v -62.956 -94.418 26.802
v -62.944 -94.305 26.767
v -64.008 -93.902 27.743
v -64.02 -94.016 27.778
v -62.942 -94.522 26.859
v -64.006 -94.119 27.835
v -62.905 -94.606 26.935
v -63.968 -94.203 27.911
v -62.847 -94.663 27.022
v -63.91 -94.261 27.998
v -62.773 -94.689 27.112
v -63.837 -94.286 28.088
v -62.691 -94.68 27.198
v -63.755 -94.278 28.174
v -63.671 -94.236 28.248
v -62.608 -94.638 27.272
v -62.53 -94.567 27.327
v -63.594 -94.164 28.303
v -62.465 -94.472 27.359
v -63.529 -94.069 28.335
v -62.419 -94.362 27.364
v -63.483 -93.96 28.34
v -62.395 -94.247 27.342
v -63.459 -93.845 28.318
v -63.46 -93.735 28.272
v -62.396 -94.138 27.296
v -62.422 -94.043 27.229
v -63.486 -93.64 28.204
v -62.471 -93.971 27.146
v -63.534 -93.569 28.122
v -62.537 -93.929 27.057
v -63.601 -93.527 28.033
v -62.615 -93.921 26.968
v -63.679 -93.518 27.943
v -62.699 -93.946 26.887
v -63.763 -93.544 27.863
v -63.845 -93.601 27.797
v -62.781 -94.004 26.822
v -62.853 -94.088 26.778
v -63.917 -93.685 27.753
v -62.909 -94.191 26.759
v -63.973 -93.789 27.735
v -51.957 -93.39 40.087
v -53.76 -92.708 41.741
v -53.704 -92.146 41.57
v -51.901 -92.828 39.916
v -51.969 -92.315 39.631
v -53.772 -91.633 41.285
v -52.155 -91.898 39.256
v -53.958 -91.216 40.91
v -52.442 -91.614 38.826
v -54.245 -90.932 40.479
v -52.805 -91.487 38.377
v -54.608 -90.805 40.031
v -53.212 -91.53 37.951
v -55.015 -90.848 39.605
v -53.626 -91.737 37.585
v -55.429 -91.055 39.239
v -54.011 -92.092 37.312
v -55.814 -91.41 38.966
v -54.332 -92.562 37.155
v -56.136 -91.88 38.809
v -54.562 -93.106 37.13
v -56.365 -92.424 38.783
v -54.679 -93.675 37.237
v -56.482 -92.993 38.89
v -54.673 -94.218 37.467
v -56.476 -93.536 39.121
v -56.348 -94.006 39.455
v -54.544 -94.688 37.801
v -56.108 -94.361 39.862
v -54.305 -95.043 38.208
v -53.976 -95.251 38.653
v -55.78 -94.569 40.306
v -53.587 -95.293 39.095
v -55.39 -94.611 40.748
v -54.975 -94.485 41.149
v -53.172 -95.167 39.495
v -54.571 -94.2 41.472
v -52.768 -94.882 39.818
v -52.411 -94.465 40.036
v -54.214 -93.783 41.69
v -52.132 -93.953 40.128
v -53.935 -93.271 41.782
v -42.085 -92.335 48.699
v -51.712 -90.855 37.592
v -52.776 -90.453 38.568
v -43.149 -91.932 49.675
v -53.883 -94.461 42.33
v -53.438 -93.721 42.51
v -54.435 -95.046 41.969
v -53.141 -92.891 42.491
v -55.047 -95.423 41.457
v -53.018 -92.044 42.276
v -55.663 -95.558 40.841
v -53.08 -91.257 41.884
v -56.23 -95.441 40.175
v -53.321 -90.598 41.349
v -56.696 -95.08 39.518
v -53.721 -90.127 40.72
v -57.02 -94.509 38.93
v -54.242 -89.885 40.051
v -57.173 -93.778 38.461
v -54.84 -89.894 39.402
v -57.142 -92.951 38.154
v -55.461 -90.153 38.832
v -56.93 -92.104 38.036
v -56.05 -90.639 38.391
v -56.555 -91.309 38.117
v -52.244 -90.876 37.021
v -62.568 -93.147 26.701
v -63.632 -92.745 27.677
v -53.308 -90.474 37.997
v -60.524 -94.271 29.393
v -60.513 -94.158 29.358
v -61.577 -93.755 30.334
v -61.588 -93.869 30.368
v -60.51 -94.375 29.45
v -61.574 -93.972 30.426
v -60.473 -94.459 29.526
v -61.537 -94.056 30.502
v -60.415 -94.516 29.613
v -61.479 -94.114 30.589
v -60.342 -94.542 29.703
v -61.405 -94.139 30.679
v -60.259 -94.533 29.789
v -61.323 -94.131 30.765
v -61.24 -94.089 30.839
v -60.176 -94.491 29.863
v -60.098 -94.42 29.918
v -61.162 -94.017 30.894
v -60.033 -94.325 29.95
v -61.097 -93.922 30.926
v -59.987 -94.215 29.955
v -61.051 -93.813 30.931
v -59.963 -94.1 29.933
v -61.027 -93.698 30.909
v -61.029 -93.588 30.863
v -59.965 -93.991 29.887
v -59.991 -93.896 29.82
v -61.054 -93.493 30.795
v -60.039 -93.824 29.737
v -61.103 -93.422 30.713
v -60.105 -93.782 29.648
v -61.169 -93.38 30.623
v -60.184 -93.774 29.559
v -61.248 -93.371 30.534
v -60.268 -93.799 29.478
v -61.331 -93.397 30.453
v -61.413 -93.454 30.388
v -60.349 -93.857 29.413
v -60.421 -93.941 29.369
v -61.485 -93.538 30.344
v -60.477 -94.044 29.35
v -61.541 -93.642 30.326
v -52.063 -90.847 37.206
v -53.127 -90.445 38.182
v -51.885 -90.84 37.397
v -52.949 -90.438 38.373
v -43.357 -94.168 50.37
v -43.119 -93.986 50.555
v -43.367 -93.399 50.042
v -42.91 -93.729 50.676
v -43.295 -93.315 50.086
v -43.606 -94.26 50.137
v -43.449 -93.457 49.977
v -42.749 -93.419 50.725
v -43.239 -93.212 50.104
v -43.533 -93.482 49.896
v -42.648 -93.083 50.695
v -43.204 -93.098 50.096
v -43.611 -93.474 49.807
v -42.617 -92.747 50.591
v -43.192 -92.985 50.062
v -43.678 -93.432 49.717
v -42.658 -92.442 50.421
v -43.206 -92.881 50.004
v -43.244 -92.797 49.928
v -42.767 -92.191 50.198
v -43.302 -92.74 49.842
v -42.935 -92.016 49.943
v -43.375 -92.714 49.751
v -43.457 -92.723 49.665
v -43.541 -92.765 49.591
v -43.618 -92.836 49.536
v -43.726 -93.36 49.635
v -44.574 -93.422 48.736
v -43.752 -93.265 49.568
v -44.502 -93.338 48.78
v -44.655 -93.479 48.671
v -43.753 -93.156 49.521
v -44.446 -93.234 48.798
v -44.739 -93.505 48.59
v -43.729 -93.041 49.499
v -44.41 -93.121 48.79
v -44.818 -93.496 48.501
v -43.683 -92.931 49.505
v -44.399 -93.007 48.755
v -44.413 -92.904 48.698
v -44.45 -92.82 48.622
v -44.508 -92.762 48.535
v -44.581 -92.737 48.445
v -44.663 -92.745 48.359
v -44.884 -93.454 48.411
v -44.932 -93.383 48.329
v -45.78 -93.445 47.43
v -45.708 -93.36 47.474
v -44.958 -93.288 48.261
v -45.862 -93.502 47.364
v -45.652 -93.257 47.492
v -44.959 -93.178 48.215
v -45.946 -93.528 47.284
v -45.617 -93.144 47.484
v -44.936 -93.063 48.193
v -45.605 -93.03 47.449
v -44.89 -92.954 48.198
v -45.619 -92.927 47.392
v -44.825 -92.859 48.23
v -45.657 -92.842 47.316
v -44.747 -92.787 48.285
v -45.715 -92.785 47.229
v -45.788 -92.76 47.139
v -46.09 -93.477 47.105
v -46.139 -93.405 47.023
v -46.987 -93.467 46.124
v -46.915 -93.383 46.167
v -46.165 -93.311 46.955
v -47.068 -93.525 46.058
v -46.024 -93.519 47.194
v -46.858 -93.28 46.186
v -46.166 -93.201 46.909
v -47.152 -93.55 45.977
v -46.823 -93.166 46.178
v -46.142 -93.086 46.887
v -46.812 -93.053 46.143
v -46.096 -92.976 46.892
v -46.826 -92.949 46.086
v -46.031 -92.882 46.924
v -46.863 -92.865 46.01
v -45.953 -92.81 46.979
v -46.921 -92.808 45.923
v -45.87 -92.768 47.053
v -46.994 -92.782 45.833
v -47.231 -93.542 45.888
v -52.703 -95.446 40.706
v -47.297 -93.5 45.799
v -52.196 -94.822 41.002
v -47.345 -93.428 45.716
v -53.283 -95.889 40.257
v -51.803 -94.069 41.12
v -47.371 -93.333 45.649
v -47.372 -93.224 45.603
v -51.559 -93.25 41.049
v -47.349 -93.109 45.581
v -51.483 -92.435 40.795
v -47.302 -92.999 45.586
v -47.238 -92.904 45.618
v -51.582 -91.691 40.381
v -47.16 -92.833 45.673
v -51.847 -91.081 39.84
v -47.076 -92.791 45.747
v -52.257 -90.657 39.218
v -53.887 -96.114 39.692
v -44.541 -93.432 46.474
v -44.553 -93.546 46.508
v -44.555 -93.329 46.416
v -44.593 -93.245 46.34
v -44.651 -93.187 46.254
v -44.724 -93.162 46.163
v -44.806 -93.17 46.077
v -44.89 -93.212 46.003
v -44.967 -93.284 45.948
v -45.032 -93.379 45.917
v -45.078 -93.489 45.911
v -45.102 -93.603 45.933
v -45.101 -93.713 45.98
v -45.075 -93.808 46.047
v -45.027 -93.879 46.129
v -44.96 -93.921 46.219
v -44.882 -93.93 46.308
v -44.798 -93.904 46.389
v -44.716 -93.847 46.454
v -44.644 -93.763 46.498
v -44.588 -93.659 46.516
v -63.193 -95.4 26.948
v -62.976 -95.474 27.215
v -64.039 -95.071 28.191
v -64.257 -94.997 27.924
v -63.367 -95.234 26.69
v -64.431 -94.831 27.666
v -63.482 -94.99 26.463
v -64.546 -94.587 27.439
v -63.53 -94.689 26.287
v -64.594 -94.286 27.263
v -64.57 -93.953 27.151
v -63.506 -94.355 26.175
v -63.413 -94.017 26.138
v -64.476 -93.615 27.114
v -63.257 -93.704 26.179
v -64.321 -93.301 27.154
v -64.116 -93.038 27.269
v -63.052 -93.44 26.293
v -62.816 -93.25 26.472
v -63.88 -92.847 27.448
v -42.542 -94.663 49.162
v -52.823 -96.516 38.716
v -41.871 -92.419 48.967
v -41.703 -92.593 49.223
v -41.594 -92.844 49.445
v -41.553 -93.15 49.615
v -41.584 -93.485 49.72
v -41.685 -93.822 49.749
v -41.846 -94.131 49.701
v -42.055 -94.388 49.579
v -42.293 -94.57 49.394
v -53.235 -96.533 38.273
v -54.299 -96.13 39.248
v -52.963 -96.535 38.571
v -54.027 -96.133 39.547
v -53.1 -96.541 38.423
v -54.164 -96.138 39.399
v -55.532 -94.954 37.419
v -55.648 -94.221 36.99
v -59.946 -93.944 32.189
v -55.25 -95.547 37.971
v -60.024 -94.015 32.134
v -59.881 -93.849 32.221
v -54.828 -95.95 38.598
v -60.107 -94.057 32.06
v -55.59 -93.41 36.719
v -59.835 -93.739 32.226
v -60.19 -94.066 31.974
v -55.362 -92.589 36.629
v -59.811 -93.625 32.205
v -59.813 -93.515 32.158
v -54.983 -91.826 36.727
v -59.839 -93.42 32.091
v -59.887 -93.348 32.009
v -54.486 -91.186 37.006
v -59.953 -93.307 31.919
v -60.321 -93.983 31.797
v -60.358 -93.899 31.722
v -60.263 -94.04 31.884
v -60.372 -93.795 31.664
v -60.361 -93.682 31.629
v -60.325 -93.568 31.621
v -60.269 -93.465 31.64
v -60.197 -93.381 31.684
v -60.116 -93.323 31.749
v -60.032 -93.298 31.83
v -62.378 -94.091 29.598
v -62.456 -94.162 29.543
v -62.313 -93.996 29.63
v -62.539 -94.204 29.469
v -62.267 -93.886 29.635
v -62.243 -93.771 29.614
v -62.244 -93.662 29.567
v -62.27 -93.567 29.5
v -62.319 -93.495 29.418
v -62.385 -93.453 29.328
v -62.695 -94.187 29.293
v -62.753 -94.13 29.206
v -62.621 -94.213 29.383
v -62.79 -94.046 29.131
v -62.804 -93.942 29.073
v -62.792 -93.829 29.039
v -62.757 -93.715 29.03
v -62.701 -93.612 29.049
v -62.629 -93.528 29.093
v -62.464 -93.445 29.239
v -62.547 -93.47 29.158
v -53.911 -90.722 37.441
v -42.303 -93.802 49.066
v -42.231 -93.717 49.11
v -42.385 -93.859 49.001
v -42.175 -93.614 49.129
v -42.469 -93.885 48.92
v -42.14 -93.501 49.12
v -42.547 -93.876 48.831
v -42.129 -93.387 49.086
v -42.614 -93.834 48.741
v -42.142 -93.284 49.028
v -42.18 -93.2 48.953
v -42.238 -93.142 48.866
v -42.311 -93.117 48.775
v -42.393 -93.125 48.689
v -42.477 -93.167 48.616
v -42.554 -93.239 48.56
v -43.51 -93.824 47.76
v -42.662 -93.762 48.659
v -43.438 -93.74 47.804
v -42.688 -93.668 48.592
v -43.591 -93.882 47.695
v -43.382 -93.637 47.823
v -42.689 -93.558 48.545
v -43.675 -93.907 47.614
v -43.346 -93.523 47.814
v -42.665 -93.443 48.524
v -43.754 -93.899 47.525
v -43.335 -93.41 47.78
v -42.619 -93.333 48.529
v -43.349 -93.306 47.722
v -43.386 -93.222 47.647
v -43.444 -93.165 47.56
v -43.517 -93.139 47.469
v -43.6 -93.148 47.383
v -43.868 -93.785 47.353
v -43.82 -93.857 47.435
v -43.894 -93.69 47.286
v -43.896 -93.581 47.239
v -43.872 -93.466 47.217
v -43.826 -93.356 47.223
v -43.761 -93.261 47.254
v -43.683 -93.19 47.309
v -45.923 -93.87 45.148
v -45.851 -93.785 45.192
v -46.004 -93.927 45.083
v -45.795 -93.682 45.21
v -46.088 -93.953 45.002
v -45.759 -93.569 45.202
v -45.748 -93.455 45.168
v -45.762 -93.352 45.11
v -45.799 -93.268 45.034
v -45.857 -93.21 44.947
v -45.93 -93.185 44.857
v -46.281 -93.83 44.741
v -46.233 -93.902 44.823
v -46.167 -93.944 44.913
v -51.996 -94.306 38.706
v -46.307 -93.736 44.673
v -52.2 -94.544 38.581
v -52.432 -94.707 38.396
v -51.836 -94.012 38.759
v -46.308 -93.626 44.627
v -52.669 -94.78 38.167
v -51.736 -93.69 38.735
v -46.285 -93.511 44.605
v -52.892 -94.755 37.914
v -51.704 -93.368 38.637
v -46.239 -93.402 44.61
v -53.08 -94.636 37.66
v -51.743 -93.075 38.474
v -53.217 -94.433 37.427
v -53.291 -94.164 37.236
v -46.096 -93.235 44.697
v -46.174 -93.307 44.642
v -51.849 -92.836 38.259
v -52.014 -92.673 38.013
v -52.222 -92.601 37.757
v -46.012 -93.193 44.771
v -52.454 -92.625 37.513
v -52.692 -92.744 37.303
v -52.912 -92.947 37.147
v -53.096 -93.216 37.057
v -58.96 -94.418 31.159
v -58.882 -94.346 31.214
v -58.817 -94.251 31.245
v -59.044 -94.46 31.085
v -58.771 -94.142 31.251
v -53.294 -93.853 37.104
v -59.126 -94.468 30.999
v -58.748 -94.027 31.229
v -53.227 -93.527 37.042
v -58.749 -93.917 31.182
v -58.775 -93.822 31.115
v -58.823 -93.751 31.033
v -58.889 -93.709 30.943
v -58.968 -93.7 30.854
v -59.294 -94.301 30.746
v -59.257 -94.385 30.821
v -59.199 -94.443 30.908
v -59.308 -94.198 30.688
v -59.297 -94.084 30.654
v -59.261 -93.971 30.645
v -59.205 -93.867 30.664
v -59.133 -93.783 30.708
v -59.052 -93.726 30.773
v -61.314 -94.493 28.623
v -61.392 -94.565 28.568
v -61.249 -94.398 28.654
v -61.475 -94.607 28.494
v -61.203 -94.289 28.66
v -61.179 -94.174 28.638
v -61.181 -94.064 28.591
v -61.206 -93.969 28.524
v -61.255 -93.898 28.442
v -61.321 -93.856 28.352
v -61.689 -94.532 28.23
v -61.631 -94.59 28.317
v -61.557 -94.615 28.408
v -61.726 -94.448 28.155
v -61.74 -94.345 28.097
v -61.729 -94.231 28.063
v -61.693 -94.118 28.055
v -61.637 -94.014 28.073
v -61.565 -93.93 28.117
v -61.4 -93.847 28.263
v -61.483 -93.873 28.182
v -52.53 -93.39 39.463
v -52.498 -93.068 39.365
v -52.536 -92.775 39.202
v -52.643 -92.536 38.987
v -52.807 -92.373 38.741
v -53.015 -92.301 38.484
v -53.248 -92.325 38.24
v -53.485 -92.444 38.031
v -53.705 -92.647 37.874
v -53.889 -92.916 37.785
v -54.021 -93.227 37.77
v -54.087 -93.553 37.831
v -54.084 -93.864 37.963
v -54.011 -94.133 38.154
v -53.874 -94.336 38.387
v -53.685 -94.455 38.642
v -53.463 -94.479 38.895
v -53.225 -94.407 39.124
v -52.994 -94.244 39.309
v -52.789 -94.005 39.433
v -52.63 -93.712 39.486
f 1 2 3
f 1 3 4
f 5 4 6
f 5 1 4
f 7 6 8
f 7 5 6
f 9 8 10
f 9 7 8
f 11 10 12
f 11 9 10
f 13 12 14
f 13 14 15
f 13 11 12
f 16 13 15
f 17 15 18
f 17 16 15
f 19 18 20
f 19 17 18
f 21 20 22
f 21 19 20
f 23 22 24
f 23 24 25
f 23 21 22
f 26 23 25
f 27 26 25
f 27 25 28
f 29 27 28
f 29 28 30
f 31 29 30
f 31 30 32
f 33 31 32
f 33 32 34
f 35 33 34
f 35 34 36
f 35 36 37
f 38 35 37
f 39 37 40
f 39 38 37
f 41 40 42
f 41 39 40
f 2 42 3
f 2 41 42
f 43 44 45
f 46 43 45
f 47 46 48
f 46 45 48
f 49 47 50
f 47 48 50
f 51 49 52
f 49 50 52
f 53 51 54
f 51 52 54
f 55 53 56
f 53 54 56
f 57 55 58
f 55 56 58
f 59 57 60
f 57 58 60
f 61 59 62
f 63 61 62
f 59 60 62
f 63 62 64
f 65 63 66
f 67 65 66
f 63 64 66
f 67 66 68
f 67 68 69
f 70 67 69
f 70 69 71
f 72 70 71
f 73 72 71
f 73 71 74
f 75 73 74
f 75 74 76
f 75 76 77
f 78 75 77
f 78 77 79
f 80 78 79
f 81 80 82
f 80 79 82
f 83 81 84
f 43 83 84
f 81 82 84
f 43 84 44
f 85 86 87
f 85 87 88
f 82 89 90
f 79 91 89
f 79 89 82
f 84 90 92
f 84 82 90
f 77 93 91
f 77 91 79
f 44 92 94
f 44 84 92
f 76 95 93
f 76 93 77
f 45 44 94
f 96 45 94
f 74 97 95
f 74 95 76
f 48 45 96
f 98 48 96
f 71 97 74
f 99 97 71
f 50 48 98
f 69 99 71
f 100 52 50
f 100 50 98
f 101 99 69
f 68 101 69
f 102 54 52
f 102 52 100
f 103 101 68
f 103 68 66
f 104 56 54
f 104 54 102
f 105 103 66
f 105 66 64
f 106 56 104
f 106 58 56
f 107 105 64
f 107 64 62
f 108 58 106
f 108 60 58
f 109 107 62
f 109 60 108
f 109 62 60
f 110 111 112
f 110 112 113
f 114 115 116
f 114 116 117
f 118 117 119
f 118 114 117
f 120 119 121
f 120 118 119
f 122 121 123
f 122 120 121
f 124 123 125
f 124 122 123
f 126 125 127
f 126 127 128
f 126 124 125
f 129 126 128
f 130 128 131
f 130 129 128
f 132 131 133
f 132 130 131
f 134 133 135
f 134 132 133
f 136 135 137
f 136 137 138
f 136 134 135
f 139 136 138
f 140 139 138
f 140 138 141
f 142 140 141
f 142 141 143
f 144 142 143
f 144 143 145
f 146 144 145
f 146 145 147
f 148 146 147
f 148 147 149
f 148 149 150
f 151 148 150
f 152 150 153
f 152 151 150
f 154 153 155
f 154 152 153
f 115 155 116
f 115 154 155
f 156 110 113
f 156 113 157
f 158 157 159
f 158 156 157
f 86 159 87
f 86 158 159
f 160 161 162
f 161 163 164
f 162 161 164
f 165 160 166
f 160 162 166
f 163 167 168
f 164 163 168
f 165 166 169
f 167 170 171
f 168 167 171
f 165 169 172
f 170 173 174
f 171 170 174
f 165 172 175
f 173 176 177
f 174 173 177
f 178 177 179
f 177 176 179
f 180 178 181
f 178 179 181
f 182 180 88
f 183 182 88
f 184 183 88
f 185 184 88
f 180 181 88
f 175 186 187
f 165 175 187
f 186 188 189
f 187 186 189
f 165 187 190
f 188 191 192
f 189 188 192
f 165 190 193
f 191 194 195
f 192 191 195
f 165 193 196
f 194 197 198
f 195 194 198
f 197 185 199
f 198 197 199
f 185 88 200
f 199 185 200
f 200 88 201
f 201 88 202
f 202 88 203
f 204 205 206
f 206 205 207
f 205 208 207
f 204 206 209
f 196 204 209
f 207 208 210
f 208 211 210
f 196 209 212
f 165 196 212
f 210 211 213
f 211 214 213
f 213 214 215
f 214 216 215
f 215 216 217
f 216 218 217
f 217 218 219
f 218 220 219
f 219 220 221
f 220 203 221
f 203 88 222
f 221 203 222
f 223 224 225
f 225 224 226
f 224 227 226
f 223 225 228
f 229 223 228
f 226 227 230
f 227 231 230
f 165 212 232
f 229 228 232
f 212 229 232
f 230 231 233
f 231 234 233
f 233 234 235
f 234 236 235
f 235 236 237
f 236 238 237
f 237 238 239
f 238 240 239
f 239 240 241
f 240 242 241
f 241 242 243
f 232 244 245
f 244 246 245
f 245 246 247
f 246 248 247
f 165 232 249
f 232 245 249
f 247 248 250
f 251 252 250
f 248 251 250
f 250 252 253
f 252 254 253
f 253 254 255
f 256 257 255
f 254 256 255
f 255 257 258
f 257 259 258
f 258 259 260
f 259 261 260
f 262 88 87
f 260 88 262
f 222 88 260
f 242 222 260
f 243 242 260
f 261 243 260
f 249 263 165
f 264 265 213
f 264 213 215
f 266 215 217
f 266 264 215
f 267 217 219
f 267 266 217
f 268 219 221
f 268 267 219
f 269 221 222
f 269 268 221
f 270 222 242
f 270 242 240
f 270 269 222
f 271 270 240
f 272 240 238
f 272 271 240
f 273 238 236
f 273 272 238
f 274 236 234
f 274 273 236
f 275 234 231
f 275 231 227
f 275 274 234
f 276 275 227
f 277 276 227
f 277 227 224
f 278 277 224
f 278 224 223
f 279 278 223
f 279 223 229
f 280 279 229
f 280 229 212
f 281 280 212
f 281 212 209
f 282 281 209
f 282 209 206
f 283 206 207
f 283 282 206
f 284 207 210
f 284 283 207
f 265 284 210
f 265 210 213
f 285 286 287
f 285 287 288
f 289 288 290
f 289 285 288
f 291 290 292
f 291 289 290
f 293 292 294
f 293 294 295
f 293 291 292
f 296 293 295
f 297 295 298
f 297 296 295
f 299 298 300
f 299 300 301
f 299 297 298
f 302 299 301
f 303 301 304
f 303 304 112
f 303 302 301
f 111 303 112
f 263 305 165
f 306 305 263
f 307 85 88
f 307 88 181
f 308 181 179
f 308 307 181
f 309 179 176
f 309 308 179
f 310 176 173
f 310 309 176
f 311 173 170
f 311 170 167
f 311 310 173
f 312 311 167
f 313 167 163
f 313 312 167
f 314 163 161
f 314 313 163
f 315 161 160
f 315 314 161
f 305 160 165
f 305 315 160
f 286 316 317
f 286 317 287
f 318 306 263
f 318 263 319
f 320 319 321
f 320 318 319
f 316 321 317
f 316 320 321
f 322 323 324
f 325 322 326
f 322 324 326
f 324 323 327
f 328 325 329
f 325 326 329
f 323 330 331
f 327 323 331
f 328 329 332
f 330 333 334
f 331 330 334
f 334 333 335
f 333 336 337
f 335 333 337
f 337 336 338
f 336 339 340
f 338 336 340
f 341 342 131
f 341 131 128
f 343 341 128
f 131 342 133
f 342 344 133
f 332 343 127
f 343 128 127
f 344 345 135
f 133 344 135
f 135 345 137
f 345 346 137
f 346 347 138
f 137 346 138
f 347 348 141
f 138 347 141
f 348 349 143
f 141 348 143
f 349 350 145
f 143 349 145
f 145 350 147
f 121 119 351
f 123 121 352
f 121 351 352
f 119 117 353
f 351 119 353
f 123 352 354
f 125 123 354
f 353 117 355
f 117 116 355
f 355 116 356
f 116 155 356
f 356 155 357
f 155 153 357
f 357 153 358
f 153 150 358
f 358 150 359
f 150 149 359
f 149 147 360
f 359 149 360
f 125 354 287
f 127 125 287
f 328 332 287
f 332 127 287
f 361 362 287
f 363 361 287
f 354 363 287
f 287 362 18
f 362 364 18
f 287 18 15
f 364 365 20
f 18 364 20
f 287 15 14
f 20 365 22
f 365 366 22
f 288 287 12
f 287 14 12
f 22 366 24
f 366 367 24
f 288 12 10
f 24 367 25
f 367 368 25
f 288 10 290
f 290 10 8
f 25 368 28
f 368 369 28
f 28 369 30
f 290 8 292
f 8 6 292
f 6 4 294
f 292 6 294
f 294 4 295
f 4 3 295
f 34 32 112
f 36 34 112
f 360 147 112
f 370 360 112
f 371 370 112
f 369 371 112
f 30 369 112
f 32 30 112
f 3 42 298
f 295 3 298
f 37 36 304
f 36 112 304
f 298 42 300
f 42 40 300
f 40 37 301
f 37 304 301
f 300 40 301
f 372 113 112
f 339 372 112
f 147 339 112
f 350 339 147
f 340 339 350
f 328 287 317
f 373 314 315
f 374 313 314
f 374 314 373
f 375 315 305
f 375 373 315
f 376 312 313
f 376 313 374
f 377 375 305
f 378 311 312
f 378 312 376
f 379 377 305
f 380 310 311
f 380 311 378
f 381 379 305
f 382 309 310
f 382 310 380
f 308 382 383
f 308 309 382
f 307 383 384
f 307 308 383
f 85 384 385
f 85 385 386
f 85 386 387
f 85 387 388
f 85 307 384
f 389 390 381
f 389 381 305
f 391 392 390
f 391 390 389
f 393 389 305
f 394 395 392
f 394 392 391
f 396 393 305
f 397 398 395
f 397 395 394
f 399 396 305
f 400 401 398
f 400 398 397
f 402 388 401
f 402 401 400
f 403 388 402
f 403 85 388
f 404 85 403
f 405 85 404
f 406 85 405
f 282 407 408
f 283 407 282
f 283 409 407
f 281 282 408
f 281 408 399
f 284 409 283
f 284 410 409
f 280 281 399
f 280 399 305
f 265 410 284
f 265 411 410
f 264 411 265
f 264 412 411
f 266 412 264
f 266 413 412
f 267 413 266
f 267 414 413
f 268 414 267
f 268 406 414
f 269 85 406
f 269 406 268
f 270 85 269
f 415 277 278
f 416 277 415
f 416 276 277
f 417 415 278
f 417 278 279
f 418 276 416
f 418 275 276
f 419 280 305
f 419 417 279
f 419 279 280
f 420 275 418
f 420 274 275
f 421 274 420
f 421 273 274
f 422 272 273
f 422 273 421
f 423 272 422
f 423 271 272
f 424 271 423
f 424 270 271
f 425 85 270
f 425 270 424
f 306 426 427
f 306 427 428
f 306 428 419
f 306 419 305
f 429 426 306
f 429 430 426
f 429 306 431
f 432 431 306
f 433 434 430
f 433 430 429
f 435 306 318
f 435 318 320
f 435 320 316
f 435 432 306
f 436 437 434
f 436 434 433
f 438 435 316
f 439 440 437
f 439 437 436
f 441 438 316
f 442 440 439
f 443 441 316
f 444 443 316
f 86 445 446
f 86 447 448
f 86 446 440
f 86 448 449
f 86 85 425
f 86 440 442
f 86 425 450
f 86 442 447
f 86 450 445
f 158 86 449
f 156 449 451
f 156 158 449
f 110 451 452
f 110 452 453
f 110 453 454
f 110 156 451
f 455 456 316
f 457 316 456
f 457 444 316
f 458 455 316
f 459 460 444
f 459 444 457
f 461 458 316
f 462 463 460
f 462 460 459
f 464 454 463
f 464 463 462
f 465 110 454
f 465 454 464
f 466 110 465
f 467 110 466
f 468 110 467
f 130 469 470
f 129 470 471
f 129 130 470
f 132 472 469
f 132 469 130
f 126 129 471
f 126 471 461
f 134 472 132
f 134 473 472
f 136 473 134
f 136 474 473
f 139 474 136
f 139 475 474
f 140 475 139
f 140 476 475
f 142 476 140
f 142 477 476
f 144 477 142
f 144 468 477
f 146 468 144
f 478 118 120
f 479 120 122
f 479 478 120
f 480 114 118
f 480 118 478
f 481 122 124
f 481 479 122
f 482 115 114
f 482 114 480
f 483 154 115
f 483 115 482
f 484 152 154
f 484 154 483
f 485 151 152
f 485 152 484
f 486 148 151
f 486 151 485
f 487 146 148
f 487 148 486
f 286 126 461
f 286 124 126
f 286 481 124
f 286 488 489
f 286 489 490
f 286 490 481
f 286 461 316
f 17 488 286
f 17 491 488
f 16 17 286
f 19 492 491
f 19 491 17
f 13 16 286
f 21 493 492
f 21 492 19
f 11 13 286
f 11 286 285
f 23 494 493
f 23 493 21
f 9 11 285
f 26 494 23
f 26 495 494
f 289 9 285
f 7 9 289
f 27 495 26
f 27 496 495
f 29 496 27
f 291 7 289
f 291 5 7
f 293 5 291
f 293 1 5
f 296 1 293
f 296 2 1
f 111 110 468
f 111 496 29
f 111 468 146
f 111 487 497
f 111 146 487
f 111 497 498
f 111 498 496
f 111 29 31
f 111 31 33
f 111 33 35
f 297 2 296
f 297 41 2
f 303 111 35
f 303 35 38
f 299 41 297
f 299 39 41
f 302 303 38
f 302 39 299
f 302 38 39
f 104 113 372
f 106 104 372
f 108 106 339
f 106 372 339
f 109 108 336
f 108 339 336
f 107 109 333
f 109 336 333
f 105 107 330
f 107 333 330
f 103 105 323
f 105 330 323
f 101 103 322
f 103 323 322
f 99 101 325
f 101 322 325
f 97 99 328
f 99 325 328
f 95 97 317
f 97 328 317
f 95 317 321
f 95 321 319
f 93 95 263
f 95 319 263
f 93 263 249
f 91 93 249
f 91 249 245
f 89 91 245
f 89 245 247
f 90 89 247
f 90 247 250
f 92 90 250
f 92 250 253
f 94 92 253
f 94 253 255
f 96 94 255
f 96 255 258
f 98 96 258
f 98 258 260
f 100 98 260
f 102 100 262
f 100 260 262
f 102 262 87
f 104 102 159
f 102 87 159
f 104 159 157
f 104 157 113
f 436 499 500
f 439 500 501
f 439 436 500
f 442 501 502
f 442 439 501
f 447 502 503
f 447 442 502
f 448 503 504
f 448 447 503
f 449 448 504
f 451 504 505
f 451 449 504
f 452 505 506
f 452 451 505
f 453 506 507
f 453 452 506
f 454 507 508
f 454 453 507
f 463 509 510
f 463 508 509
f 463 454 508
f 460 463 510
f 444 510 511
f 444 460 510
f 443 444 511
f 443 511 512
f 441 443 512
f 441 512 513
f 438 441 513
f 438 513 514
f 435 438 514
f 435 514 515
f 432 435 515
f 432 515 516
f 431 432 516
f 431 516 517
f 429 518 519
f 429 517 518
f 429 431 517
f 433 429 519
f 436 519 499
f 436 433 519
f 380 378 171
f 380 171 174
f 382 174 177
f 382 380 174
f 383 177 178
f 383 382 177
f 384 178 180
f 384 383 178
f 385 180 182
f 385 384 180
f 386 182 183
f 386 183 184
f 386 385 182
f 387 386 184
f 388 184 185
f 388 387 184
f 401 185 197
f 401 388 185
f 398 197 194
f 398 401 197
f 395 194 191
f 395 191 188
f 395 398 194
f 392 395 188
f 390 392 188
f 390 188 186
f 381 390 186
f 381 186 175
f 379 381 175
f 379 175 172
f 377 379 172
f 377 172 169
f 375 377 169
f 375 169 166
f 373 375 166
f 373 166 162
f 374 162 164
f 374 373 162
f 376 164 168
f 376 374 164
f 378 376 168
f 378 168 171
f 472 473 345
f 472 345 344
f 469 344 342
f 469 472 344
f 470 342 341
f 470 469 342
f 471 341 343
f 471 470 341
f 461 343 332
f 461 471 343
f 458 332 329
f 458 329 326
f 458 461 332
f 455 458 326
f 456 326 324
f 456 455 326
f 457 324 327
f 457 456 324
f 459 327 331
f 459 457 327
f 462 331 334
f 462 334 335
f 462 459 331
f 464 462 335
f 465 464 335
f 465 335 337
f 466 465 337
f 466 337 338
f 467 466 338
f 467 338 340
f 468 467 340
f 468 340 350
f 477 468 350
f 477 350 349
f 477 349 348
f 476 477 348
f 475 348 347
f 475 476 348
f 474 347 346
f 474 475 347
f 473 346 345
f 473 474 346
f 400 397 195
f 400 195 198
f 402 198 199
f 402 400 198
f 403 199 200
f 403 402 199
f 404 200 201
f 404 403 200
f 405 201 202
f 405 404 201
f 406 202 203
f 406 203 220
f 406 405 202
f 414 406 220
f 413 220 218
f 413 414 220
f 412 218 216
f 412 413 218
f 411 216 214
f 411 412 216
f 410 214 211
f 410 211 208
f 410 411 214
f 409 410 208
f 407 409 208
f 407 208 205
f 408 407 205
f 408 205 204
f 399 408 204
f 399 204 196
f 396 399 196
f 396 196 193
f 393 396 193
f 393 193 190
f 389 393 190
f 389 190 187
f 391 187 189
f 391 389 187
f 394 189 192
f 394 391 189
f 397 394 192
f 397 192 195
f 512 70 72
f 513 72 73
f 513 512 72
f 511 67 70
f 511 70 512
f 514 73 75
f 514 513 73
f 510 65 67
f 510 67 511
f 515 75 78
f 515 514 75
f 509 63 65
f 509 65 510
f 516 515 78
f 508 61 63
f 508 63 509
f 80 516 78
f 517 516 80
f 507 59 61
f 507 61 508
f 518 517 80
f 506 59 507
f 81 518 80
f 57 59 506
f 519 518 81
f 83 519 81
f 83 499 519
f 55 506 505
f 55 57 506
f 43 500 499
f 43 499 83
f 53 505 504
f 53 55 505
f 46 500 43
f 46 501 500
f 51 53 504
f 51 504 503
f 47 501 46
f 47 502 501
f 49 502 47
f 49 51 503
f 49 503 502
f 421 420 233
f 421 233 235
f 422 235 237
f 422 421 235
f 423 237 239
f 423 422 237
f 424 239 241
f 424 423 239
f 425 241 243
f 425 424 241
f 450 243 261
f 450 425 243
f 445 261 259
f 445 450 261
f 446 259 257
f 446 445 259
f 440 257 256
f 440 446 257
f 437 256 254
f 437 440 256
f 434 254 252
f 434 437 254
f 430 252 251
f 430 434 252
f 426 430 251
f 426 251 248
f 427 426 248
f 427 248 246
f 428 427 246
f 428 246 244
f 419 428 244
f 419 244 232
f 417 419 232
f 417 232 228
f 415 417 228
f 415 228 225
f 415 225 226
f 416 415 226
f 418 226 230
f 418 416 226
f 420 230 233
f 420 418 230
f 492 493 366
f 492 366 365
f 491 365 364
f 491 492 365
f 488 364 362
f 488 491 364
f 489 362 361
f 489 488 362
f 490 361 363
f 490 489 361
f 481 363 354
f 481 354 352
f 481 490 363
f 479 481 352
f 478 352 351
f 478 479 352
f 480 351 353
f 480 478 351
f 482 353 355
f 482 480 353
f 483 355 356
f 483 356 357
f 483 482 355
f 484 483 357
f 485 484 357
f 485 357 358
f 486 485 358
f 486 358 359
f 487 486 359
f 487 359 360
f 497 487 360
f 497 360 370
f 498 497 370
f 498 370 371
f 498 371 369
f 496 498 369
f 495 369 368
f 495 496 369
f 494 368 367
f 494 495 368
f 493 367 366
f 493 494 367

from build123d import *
from build123d.topology import SkipClean

# Parameters (mm, degrees)
SKETCH1_R           = 1.134023506
SKETCH1_R_2         = 0.399750463
BOSS_EXTRUDE1_DEPTH = 1.4986
SKETCH2_R           = 2.9591
BOSS_EXTRUDE2_DEPTH = 2.159
SKETCH3_R           = 1.9812
CUT_EXTRUDE1_DEPTH  = 2.54


with BuildPart() as part:
    # Sketch1 → Boss-Extrude1 (new body)
    with BuildSketch(Plane(origin=(-26.118953855, 9.878989701, 23.95417966), x_dir=(0.6811926509137779, 0.027031276316117844, 0.7316050043854141), z_dir=(-0.7099227615957759, 0.26851456951758673, 0.6510834036627045))):
        with BuildLine():
            Line((-10.17960006, -104.330094763), (4.464711493, -106.277674051))
            ThreePointArc((4.464711493, -106.277674051), (5.521063626, -107.502012677), (4.428867403, -108.694485866))
            Line((4.428867403, -108.694485866), (-10.26676012, -110.206920218))
            ThreePointArc((-10.26676012, -110.206920218), (-10.569702558, -110.222468165), (-10.872644997, -110.206920218))
            Line((-10.872644997, -110.206920218), (-25.56827252, -108.694485866))
            ThreePointArc((-25.56827252, -108.694485866), (-26.660468742, -107.502012677), (-25.60411661, -106.277674051))
            Line((-25.60411661, -106.277674051), (-10.959805057, -104.330094763))
            ThreePointArc((-10.959805057, -104.330094763), (-10.569702558, -104.304268165), (-10.17960006, -104.330094763))
        make_face()
        with Locations(Location((-10.569702558, -107.263368165, 0), (0, 0, 358.39196451))):
            Circle(SKETCH1_R, mode=Mode.SUBTRACT)
        with Locations(Location((4.304284008, -107.48396644, 0), (0, 0, 358.39196451))):
            Circle(SKETCH1_R_2, mode=Mode.SUBTRACT)
        with Locations(Location((2.526284008, -107.457596661, 0), (0, 0, 358.39196451))):
            Circle(SKETCH1_R_2, mode=Mode.SUBTRACT)
        with Locations(Location((0.748284008, -107.431226882, 0), (0, 0, 358.39196451))):
            Circle(SKETCH1_R_2, mode=Mode.SUBTRACT)
        with Locations(Location((-1.029715992, -107.404857104, 0), (0, 0, 358.39196451))):
            Circle(SKETCH1_R_2, mode=Mode.SUBTRACT)
        with Locations(Location((-20.109689125, -107.404857104, 0), (0, 0, 178.39196451))):
            Circle(SKETCH1_R_2, mode=Mode.SUBTRACT)
        with Locations(Location((-21.887689125, -107.431226882, 0), (0, 0, 178.39196451))):
            Circle(SKETCH1_R_2, mode=Mode.SUBTRACT)
        with Locations(Location((-23.665689125, -107.457596661, 0), (0, 0, 178.39196451))):
            Circle(SKETCH1_R_2, mode=Mode.SUBTRACT)
        with Locations(Location((-25.443689125, -107.48396644, 0), (0, 0, 178.39196451))):
            Circle(SKETCH1_R_2, mode=Mode.SUBTRACT)
    extrude(amount=BOSS_EXTRUDE1_DEPTH)

    # Sketch2 → Boss-Extrude2 (add)
    with SkipClean():  # the faces are left unmerged after this step: merging them gives an invalid solid
        with BuildSketch(Plane(origin=(-27.182844105, 10.281385635, 24.929893249), x_dir=(0.681192650913778, 0.027031276316117795, 0.731605004385414), z_dir=(-0.7099227615957758, 0.2685145695175868, 0.6510834036627047))):
            with Locations(Location((-10.569702558, -107.263368165, 0), (0, 0, 97.575438716))):
                Circle(SKETCH2_R)
        extrude(amount=BOSS_EXTRUDE2_DEPTH)

    # Sketch3 → Cut-Extrude1 (cut)
    with SkipClean():  # the faces are left unmerged after this step: merging them gives an invalid solid
        with BuildSketch(Plane(origin=(-28.715567348, 10.861108591, 26.335582317), x_dir=(0.6811926509137781, 0.02703127631611777, 0.731605004385414), z_dir=(-0.7099227615957758, 0.26851456951758684, 0.6510834036627048))):
            with Locations(Location((-10.569702558, -107.263368165, 0), (0, 0, 358.39196451))):
                Circle(SKETCH3_R)
        extrude(amount=-CUT_EXTRUDE1_DEPTH, mode=Mode.SUBTRACT)


solid = part.part
